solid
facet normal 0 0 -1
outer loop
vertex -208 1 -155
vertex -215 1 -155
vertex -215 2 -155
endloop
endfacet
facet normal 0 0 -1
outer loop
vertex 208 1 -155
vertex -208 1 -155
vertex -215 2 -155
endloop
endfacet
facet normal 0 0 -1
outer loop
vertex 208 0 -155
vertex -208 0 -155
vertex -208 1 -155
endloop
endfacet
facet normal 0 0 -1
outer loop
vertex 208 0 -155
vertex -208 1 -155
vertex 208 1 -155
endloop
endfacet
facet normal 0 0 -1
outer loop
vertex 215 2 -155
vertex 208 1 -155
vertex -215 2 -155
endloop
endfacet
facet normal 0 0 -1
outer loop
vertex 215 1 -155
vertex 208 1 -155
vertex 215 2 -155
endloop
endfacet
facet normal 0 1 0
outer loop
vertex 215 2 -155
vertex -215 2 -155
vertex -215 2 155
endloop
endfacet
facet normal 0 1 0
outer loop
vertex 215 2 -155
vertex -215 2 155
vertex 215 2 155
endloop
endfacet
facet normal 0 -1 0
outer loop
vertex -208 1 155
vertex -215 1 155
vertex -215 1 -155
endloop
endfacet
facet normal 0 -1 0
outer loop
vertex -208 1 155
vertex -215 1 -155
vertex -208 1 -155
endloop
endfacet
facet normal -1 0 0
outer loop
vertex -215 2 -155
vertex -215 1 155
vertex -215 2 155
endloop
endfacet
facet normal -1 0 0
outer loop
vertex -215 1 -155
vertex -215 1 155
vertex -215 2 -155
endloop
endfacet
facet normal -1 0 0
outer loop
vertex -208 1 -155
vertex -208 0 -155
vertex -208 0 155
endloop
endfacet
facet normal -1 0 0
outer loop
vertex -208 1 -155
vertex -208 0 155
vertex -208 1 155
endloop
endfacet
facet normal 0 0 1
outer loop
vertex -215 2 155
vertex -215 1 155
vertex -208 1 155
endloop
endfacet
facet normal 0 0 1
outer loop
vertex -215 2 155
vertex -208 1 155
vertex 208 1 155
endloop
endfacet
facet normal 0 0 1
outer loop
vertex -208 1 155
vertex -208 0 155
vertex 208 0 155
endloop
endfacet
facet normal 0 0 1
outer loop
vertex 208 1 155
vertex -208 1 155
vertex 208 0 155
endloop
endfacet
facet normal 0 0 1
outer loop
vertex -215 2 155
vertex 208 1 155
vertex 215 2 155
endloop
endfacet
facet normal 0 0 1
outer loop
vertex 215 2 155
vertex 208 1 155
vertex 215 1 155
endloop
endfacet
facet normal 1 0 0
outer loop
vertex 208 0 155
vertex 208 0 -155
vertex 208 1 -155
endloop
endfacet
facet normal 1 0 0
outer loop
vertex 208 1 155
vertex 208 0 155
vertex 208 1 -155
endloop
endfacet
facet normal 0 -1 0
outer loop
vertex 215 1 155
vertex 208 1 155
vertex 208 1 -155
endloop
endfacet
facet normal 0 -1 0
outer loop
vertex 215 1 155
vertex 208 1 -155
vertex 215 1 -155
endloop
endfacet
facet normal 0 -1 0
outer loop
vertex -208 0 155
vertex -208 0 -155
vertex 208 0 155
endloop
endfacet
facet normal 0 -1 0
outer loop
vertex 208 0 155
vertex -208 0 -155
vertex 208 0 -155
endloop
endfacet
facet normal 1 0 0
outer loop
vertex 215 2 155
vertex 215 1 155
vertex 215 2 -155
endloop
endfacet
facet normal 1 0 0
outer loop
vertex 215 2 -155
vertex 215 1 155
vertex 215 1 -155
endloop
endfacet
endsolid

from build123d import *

# Parameters (mm, degrees)
SKETCH1_W           = 430
SKETCH1_H           = 310
BOSS_EXTRUDE1_DEPTH = 2
SKETCH2_W           = 7
SKETCH2_H           = 1
CUT_EXTRUDE1_DEPTH  = 311


with BuildPart() as part:
    # Sketch1 → Boss-Extrude1 (new body)
    with BuildSketch(Plane(origin=(0, 0, 0), x_dir=(1, 0, 0), z_dir=(0, 1, 0))):
        Rectangle(SKETCH1_W, SKETCH1_H)
    extrude(amount=BOSS_EXTRUDE1_DEPTH)

    # Sketch2 → Cut-Extrude1 (cut, through all)
    with BuildSketch(Plane.XY.offset(155)):
        with Locations((-211.5, 0.5)):
            Rectangle(SKETCH2_W, SKETCH2_H)
        with Locations((211.5, 0.5)):
            Rectangle(SKETCH2_W, SKETCH2_H)
    extrude(amount=-CUT_EXTRUDE1_DEPTH, mode=Mode.SUBTRACT)


solid = part.part
